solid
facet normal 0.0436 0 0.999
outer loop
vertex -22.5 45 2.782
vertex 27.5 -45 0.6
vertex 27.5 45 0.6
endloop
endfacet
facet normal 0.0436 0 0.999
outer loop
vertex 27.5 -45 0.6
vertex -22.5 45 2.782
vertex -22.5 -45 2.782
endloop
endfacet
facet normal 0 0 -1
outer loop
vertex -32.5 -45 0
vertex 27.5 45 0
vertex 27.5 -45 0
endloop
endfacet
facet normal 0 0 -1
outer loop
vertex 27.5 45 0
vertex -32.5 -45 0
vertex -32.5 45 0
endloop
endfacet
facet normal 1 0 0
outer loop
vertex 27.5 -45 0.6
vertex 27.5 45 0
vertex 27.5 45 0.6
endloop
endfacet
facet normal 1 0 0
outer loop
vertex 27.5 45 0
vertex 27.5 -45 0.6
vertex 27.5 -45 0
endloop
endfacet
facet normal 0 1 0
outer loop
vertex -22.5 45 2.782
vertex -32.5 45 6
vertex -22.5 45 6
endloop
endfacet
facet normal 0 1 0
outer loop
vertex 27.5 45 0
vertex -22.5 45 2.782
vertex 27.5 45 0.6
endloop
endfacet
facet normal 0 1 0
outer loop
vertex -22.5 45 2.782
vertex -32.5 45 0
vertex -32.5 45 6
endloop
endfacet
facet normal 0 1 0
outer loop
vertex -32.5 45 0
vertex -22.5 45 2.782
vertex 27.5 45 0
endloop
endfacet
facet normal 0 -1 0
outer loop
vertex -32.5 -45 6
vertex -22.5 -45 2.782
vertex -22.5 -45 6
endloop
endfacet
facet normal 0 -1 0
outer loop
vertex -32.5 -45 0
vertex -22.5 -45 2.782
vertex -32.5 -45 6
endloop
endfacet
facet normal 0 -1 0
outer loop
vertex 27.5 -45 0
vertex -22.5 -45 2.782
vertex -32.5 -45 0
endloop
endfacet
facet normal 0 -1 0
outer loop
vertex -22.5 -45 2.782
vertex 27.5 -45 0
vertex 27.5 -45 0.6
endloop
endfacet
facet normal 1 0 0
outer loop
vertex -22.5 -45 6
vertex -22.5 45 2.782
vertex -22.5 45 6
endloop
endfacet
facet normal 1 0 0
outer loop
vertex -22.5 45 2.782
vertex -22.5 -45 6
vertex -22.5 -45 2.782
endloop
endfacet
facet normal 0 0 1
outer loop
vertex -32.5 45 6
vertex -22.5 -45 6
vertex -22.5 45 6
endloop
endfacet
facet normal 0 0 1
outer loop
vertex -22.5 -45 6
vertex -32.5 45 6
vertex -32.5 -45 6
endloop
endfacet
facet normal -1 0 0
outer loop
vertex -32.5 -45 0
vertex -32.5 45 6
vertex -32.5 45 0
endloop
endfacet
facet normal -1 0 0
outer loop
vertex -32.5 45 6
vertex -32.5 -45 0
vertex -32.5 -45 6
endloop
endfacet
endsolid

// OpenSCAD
//Parametric scraper / tape applicator / door stop / toy car jump / whatever.
//"height" is the distance from the thin edge to the thick edge.
//"length" runs along the thin edge (and thick) and defines how wide the scraper will be
//default is about business card sized
//size1 and size2 are the thin and thick parts

sizx=55;	//height 
sizy=90; //length along the scraper
sizz1=0.6;	//thickness of the thinnest part
sizz2=3;	//thickness of the thickest part
hz=sizz2+3;	//thickness of the handle
hx=10;		//other bit of the handle
handle=1;	//1=yes 0=no


if ( handle == 1 )
{
polyscrape();
translate([-sizx/2,0,hz/2])cube([10,sizy,hz],center=true);
}
else
{
polyscrape();
}

module polyscrape()
{
polyhedron(
  points=[ [sizx/2,sizy/2,0],[sizx/2,-sizy/2,0],[-sizx/2,-sizy/2,0],[-sizx/2,sizy/2,0],
			[sizx/2,sizy/2,sizz1],[sizx/2,-sizy/2,sizz1],[-sizx/2,-sizy/2,sizz2],[-sizx/2,sizy/2,sizz2]], 
      faces=[[0,3,2,1],//bottom
            [0,1,5,4],//small
            [1,2,6,5],//right
            [2,3,7,6],//big
            [0,4,7,3],//right 
            [4,5,6,7]]//top
 );
}
